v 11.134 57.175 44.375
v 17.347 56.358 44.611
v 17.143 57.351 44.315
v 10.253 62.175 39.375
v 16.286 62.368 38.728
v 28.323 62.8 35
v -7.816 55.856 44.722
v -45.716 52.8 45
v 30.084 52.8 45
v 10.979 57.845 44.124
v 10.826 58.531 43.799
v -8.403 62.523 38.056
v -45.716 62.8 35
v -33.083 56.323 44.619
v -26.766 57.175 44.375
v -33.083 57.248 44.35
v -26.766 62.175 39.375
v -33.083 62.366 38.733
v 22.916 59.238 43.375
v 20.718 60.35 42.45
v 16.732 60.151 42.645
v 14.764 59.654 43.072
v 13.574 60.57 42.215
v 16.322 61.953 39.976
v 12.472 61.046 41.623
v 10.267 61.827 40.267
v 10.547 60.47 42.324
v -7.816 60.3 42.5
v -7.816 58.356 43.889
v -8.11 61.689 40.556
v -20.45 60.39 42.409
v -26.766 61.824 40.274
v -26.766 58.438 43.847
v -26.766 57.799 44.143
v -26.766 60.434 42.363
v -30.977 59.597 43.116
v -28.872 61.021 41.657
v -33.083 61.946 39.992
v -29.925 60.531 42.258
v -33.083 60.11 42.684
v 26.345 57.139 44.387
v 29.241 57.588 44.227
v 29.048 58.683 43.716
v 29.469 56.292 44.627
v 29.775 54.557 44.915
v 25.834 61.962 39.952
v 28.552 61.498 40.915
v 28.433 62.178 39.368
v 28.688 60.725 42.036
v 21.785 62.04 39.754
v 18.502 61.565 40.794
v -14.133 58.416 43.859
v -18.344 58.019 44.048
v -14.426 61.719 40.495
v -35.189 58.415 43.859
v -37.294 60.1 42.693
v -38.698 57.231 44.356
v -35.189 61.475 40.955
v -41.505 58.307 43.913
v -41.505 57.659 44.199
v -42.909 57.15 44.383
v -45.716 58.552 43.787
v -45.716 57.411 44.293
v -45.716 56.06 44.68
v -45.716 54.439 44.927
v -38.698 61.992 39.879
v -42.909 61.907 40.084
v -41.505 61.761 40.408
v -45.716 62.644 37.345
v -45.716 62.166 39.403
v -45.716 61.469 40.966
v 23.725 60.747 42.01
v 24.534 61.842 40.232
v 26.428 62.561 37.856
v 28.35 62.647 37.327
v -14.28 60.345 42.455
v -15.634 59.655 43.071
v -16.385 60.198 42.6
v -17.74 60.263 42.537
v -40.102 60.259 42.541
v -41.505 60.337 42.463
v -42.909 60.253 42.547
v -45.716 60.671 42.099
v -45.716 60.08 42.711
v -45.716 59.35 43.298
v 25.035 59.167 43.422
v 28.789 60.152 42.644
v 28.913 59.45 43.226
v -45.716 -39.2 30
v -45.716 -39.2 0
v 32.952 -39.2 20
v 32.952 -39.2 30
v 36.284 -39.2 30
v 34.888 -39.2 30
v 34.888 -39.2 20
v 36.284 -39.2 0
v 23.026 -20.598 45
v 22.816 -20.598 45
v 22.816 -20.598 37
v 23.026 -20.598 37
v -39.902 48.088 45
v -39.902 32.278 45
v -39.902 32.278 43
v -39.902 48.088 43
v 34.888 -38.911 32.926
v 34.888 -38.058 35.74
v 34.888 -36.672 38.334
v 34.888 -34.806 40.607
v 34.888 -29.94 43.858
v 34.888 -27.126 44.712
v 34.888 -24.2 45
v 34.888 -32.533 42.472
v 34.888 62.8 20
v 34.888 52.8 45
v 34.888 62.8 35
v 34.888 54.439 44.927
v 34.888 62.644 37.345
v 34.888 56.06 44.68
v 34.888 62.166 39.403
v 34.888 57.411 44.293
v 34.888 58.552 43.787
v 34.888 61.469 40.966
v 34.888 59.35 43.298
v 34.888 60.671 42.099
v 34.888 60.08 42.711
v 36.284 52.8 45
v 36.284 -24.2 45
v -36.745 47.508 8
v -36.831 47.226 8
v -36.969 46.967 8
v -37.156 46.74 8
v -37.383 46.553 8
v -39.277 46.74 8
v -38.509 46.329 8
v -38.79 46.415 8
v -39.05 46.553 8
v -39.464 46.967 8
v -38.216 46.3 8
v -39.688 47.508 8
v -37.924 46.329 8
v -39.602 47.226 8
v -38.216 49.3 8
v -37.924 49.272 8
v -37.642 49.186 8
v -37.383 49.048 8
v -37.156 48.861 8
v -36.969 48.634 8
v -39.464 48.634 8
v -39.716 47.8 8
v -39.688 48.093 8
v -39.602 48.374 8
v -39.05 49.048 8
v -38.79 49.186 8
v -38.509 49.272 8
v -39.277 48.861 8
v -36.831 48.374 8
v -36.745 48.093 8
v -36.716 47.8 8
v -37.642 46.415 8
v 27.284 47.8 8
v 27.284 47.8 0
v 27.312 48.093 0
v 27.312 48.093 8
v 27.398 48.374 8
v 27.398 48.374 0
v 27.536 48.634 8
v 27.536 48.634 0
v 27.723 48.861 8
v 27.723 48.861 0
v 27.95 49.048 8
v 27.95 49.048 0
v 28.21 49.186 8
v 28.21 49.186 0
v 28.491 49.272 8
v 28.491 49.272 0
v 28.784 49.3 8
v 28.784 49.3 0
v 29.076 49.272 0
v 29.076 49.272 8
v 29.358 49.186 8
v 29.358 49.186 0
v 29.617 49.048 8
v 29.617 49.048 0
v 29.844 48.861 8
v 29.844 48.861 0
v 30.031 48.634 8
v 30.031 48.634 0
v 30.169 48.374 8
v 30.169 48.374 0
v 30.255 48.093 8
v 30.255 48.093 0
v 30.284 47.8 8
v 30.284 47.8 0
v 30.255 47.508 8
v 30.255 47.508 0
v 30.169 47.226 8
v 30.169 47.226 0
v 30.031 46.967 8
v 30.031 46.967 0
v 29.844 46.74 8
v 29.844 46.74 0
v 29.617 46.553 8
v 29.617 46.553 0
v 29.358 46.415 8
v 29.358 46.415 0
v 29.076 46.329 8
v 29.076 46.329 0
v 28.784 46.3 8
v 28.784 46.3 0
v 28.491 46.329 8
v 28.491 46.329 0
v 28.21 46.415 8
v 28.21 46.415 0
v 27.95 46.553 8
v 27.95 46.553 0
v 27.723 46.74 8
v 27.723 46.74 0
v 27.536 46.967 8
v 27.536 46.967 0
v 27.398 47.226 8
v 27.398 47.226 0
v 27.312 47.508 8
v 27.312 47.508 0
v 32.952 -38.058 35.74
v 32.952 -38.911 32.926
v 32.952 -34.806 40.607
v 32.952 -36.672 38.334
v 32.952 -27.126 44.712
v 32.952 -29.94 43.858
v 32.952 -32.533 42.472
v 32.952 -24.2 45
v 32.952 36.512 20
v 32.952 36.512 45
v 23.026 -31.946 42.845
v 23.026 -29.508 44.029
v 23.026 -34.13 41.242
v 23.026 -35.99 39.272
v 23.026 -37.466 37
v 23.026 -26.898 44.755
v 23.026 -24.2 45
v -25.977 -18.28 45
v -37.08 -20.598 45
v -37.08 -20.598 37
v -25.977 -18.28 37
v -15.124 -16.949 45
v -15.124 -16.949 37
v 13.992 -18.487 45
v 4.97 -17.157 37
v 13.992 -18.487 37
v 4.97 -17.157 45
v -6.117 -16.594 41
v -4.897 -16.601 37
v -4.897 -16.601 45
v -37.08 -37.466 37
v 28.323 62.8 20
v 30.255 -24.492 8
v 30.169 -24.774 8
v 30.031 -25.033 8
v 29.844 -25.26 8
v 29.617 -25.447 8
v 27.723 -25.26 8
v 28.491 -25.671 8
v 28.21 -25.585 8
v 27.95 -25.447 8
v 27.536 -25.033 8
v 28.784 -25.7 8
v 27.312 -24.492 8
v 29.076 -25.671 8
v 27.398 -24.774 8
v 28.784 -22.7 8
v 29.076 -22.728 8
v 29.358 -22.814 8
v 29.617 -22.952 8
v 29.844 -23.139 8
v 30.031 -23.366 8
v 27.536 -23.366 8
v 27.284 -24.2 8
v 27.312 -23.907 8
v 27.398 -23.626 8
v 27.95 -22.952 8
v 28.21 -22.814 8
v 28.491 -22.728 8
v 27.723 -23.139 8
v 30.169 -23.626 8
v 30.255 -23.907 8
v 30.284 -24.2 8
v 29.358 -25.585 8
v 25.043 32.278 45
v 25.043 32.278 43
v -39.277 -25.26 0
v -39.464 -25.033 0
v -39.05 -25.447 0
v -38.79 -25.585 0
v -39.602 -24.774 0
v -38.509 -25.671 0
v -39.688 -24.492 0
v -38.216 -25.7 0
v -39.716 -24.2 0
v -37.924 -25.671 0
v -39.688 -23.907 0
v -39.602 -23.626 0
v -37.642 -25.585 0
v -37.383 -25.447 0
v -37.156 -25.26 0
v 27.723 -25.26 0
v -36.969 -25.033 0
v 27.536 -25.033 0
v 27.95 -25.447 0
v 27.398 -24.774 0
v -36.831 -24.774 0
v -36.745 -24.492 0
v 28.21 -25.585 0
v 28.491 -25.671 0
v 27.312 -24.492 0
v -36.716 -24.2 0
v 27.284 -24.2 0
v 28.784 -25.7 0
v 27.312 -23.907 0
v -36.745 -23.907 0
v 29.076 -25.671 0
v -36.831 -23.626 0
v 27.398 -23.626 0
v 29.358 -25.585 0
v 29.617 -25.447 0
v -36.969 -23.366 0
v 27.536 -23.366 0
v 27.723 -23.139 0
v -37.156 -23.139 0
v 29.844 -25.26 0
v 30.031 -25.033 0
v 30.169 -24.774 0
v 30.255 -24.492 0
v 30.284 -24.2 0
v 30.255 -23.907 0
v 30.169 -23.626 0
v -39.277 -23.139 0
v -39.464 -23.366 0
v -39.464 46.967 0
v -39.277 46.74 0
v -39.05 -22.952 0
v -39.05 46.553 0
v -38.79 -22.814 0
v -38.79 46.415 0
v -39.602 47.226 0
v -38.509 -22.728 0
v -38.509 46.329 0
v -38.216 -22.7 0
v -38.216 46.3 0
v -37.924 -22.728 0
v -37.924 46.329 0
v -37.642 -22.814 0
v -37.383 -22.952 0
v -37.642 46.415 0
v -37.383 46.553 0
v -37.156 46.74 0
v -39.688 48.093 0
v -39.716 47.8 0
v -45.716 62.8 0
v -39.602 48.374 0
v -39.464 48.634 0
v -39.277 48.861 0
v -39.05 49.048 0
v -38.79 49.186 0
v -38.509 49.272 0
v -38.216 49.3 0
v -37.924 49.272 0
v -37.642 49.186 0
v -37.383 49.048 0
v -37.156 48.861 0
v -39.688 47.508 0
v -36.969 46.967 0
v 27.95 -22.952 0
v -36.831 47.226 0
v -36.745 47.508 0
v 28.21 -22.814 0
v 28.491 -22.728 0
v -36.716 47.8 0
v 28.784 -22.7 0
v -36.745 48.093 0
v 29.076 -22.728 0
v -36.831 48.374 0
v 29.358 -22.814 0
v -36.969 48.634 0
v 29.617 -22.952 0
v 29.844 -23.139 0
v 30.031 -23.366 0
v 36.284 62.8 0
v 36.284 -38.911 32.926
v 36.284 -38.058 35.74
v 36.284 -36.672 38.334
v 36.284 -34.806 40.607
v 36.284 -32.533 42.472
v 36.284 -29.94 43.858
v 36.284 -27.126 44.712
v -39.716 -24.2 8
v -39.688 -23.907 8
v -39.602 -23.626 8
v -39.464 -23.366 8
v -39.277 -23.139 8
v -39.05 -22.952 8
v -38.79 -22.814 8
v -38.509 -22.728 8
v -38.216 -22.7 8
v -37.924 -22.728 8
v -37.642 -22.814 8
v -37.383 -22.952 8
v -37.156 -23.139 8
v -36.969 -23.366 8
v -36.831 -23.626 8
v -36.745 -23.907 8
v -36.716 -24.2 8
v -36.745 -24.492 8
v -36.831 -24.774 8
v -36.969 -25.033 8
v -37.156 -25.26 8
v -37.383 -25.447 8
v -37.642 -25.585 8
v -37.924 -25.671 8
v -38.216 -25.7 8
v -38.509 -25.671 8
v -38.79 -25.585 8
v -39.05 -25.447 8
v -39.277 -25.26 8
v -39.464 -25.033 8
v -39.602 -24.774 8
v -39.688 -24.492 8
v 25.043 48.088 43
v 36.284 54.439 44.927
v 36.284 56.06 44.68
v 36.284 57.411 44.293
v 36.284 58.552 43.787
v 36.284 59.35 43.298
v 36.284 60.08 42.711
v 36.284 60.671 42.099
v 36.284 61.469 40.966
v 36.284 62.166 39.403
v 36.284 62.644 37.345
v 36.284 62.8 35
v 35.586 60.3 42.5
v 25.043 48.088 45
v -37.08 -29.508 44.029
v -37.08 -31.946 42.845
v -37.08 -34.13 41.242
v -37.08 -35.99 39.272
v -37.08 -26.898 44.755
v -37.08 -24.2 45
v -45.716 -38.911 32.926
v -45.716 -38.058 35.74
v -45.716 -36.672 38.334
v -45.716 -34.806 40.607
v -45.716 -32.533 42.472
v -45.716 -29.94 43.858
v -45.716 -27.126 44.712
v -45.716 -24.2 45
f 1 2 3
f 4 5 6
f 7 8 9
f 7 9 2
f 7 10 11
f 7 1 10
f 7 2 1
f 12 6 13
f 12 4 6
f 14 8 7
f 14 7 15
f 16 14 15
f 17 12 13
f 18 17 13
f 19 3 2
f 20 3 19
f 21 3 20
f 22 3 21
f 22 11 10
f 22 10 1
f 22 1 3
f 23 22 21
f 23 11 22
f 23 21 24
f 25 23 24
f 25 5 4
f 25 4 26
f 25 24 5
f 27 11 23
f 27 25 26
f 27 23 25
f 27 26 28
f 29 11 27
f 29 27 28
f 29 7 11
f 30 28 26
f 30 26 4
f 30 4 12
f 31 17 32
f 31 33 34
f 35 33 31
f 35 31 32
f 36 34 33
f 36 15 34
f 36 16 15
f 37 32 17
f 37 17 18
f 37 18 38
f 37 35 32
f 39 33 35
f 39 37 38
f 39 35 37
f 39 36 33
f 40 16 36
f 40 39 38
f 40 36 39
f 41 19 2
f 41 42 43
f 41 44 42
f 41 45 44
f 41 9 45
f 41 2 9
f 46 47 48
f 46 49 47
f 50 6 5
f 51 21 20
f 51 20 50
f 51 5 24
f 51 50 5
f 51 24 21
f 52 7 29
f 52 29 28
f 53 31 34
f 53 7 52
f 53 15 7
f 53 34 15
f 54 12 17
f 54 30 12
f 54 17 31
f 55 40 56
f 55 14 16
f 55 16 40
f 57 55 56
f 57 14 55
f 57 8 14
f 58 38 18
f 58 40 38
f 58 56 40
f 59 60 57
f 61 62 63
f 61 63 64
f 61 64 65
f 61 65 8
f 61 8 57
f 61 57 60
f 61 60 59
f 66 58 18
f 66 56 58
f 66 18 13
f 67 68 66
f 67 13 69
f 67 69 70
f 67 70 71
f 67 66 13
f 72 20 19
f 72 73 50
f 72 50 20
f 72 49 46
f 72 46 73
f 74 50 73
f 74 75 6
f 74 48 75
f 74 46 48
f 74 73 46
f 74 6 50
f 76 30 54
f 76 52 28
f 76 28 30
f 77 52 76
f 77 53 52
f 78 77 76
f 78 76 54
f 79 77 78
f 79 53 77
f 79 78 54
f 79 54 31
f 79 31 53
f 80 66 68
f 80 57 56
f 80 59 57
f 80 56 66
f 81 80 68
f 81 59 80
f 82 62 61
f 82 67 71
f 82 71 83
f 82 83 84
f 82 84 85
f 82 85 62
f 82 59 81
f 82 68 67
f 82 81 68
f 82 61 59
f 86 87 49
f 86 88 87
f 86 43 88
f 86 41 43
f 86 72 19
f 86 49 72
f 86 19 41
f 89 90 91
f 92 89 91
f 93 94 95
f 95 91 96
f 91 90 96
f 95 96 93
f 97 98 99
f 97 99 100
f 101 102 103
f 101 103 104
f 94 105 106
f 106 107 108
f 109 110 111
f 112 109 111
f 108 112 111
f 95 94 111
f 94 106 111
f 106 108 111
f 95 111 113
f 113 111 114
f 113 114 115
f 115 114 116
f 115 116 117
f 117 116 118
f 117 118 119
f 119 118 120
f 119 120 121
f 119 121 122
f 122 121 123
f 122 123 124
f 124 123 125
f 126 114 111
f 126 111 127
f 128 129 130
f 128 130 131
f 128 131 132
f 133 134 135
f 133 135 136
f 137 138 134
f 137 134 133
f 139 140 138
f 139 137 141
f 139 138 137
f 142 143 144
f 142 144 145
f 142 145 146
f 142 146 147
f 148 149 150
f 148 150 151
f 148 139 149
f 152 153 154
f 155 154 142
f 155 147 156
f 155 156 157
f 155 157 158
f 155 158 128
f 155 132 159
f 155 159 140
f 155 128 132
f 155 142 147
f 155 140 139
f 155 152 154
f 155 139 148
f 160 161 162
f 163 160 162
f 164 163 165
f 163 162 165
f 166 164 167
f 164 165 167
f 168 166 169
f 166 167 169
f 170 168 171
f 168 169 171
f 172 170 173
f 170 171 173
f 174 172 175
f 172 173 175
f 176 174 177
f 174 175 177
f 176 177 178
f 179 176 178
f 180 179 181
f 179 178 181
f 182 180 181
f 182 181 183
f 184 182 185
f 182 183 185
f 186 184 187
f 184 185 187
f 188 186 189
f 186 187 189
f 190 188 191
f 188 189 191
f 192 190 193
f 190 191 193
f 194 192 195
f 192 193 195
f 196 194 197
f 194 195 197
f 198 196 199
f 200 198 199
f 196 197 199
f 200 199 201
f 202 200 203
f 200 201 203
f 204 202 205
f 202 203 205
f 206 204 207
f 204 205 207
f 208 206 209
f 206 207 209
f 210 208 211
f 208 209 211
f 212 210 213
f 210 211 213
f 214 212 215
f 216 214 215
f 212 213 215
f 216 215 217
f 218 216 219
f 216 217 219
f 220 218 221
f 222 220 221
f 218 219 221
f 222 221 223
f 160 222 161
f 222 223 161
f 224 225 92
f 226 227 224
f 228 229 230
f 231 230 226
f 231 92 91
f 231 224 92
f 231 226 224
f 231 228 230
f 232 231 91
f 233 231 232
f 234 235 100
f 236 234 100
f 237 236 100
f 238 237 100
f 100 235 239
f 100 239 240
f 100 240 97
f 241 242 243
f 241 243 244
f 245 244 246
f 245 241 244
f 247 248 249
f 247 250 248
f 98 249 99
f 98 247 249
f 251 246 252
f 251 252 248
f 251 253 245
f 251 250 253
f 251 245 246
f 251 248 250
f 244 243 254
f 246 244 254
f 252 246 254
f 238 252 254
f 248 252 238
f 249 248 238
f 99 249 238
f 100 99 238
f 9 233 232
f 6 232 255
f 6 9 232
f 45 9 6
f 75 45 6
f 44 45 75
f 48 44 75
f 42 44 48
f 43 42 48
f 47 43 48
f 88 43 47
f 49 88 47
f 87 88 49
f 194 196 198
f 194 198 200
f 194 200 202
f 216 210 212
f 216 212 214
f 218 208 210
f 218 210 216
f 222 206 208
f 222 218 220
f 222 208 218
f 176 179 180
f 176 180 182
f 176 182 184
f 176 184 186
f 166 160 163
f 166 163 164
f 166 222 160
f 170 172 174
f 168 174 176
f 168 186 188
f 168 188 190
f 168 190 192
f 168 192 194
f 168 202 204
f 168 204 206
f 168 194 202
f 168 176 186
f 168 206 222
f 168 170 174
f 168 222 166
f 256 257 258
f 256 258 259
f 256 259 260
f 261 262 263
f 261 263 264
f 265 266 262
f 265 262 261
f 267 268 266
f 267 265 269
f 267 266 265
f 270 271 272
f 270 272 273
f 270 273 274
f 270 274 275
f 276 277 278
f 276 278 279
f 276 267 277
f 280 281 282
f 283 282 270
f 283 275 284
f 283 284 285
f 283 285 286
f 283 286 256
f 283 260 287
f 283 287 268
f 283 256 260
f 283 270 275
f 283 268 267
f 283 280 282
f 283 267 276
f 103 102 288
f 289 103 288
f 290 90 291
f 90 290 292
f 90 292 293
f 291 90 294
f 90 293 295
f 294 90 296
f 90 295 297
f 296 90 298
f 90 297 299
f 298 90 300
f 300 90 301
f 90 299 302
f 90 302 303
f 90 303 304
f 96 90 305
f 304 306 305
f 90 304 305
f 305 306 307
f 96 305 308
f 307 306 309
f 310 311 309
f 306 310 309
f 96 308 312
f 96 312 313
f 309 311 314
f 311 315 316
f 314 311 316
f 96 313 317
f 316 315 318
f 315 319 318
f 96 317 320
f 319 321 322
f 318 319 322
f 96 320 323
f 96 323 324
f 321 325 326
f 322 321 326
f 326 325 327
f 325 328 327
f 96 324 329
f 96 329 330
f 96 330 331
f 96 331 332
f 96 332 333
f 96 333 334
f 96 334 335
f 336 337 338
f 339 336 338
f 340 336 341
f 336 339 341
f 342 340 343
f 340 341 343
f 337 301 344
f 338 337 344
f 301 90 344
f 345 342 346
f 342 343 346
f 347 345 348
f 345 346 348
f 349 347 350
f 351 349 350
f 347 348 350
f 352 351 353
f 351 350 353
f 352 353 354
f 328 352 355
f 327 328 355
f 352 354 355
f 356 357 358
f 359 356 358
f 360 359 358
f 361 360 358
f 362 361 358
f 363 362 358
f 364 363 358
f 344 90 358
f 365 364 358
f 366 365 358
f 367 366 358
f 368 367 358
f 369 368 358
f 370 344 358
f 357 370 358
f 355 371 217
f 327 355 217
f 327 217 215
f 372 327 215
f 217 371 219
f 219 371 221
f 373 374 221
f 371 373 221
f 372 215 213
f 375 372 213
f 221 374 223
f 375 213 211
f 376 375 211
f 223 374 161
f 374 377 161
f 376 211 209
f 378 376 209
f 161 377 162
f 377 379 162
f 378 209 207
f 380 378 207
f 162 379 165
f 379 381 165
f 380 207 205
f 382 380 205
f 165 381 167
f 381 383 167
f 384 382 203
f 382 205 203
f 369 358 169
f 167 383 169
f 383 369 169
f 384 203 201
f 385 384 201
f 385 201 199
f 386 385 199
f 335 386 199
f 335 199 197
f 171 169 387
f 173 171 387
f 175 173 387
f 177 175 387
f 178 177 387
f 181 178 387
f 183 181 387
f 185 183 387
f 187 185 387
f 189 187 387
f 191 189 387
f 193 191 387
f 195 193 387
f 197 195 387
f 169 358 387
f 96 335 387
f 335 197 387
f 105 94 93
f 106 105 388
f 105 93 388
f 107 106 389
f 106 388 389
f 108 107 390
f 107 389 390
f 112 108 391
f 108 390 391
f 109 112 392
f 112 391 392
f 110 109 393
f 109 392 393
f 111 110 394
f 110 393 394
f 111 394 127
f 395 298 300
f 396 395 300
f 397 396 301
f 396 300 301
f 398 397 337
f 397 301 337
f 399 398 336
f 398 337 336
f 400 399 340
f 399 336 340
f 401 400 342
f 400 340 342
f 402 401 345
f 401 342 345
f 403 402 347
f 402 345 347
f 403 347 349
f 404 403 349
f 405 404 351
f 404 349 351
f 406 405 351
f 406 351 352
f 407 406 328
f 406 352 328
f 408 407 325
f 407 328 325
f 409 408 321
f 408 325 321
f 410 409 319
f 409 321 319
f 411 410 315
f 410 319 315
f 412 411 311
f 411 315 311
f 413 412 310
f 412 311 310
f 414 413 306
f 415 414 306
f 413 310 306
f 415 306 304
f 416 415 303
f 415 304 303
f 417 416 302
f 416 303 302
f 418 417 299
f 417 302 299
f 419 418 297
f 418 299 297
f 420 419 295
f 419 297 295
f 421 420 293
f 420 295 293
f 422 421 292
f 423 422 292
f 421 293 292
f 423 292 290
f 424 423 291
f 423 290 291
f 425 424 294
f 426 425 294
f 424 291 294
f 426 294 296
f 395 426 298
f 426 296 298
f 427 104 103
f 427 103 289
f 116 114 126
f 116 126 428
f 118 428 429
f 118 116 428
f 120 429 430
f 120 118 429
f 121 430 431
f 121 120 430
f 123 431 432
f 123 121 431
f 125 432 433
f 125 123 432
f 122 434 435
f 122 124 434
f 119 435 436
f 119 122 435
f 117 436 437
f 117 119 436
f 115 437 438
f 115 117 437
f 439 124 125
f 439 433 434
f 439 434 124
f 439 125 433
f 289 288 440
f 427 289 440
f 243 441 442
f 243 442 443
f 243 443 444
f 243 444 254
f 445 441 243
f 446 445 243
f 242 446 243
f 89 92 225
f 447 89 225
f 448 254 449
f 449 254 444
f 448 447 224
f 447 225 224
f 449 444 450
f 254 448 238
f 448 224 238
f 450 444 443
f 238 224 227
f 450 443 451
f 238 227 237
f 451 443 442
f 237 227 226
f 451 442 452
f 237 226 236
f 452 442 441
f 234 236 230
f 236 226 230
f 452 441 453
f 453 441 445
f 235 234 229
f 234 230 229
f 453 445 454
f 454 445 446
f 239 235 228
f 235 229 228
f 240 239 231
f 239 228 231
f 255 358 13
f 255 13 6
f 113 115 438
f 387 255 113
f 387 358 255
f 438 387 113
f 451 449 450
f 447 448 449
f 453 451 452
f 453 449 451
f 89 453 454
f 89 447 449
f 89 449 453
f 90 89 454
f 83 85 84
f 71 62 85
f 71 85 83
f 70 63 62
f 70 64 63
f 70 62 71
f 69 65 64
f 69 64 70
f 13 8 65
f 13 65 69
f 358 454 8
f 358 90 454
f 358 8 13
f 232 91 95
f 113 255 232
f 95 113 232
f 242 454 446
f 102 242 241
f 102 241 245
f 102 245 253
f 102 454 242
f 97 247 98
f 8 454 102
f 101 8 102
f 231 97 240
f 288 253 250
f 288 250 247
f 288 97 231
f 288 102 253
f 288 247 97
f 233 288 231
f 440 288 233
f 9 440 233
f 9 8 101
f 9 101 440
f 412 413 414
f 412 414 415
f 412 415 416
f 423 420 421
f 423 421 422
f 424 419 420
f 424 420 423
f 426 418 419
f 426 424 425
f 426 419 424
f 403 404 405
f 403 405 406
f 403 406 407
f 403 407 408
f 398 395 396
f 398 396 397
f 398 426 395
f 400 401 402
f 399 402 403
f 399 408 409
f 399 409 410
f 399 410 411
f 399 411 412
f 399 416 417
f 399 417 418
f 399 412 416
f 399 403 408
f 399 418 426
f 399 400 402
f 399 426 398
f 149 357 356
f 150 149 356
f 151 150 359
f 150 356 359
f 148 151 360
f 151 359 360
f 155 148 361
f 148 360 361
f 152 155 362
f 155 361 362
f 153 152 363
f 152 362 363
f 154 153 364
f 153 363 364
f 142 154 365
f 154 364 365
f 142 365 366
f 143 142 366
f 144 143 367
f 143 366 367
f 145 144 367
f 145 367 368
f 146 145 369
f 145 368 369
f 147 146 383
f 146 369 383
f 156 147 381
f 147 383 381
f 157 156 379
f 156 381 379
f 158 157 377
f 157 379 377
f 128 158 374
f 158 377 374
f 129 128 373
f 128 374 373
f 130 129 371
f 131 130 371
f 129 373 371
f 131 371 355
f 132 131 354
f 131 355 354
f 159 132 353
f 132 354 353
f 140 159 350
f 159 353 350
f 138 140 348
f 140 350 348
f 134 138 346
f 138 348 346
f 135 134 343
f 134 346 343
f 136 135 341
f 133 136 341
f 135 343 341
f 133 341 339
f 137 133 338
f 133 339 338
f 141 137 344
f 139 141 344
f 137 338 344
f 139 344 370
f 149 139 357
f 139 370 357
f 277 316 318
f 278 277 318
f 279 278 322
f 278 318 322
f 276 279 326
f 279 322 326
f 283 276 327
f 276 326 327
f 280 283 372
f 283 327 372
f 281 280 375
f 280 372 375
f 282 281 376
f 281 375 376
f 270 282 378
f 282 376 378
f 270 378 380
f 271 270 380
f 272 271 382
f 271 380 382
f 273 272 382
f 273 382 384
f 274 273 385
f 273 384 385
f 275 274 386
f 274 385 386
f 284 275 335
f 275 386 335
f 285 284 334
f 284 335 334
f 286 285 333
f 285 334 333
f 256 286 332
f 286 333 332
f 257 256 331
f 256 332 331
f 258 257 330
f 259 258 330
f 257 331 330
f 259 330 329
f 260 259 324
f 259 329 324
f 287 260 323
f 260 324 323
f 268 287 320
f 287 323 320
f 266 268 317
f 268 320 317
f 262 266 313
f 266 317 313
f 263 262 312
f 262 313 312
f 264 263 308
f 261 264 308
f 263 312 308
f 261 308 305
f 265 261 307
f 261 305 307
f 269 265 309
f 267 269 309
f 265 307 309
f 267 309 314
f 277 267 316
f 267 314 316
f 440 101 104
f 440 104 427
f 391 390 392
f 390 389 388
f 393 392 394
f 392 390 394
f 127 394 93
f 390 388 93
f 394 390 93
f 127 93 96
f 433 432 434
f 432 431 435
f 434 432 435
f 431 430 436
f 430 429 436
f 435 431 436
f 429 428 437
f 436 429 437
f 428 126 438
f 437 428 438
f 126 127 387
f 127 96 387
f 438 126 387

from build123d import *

# Parameters (mm, degrees)
SKETCH1_W           = 82
SKETCH1_H           = 102
BOSS_EXTRUDE1_DEPTH = 45
FILLET1_R           = 15
FILLET2_SIZE        = 10
SKETCH2_W           = 1.935509438
SKETCH2_H           = 108.039568053
CUT_EXTRUDE1_DEPTH  = 25
CUT_EXTRUDE2_DEPTH  = 25
SKETCH4_W           = 64.944344057
SKETCH4_H           = 15.809351463
CUT_EXTRUDE3_DEPTH  = 2
CUT_EXTRUDE4_DEPTH  = 8
SKETCH6_W           = 60.105213435
SKETCH6_H           = 24.98512856
CUT_EXTRUDE5_DEPTH  = 8
SKETCH7_R           = 1.5
CUT_EXTRUDE6_DEPTH  = 8


with BuildPart() as part:
    # Sketch1 → Boss-Extrude1 (new body)
    with BuildSketch(Plane.XY):
        with Locations((-4.71634799, 11.800448269)):
            Rectangle(SKETCH1_W, SKETCH1_H)
    extrude(amount=BOSS_EXTRUDE1_DEPTH)

    # Fillet1
    fillet1_edges = [part.edges().sort_by_distance(p)[0] for p in [
        (-4.71634799, -39.199551731, 45),
    ]]
    fillet(fillet1_edges, radius=FILLET1_R)

    # Fillet2
    # a fillet whose section is not a circle: 10 mm, written as the material it takes off along each edge
    with BuildSketch(Plane(origin=(-70.71634799, 62.800448269, 45), x_dir=(0, -1, 0), z_dir=(1, 0, 0))) as fillet2_piece_1:
        with BuildLine():
            Bezier((FILLET2_SIZE, 0), (0, 0), (0, FILLET2_SIZE), weights=[1, 1, 1])
            Line((0, FILLET2_SIZE), (0, 0))
            Line((0, 0), (FILLET2_SIZE, 0))
        make_face()
    extrude(amount=132, mode=Mode.SUBTRACT)

    # Sketch2 → Cut-Extrude1 (cut)
    with BuildSketch(Plane.XY.offset(45)):
        with Locations((33.920109965, 11.021338758)):
            Rectangle(SKETCH2_W, SKETCH2_H)
    extrude(amount=-CUT_EXTRUDE1_DEPTH, mode=Mode.SUBTRACT)

    # Sketch3 → Cut-Extrude2 (cut)
    with BuildSketch(Plane.XY.offset(45)):
        Polygon((32.952355246, 36.51166629), (28.204087152, 63.475951779), (32.952355246, 63.475951779), align=None)
    extrude(amount=-CUT_EXTRUDE2_DEPTH, mode=Mode.SUBTRACT)

    # Sketch4 → Cut-Extrude3 (cut)
    with BuildSketch(Plane.XY.offset(45)):
        with Locations((-7.429597209, 40.183157287)):
            Rectangle(SKETCH4_W, SKETCH4_H)
    extrude(amount=-CUT_EXTRUDE3_DEPTH, mode=Mode.SUBTRACT)

    # Sketch5 → Cut-Extrude4 (cut)
    with BuildSketch(Plane.XY.offset(45)):
        with BuildLine():
            Line((-37.079623524, -20.597881777), (22.815677351, -20.597881777))
            add(Edge.make_bspline(
                [(-37.079623524, -20.597881777), (-5.102026038, -12.590864718), (22.815677351, -20.597881777)],
                knots=[0, 0, 0, 0.561199211, 0.561199211, 0.561199211], degree=2))
        make_face()
    extrude(amount=-CUT_EXTRUDE4_DEPTH, mode=Mode.SUBTRACT)

    # Sketch6 → Cut-Extrude5 (cut)
    with BuildSketch(Plane.XY.offset(45)):
        with Locations((-7.027016807, -33.090446057)):
            Rectangle(SKETCH6_W, SKETCH6_H)
    extrude(amount=-CUT_EXTRUDE5_DEPTH, mode=Mode.SUBTRACT)

    # Sketch7 → Cut-Extrude6 (cut)
    with BuildSketch(Plane(origin=(0, 0, 0), x_dir=(-1, 0, 0), z_dir=(0, 0, -1))):
        with Locations((-28.78365201, 47.800448269)):
            Circle(SKETCH7_R)
        with Locations((38.21634799, 47.800448269)):
            Circle(SKETCH7_R)
        with Locations((38.21634799, -24.199551731)):
            Circle(SKETCH7_R)
        with Locations((-28.78365201, -24.199551731)):
            Circle(SKETCH7_R)
    extrude(amount=-CUT_EXTRUDE6_DEPTH, mode=Mode.SUBTRACT)


solid = part.part
